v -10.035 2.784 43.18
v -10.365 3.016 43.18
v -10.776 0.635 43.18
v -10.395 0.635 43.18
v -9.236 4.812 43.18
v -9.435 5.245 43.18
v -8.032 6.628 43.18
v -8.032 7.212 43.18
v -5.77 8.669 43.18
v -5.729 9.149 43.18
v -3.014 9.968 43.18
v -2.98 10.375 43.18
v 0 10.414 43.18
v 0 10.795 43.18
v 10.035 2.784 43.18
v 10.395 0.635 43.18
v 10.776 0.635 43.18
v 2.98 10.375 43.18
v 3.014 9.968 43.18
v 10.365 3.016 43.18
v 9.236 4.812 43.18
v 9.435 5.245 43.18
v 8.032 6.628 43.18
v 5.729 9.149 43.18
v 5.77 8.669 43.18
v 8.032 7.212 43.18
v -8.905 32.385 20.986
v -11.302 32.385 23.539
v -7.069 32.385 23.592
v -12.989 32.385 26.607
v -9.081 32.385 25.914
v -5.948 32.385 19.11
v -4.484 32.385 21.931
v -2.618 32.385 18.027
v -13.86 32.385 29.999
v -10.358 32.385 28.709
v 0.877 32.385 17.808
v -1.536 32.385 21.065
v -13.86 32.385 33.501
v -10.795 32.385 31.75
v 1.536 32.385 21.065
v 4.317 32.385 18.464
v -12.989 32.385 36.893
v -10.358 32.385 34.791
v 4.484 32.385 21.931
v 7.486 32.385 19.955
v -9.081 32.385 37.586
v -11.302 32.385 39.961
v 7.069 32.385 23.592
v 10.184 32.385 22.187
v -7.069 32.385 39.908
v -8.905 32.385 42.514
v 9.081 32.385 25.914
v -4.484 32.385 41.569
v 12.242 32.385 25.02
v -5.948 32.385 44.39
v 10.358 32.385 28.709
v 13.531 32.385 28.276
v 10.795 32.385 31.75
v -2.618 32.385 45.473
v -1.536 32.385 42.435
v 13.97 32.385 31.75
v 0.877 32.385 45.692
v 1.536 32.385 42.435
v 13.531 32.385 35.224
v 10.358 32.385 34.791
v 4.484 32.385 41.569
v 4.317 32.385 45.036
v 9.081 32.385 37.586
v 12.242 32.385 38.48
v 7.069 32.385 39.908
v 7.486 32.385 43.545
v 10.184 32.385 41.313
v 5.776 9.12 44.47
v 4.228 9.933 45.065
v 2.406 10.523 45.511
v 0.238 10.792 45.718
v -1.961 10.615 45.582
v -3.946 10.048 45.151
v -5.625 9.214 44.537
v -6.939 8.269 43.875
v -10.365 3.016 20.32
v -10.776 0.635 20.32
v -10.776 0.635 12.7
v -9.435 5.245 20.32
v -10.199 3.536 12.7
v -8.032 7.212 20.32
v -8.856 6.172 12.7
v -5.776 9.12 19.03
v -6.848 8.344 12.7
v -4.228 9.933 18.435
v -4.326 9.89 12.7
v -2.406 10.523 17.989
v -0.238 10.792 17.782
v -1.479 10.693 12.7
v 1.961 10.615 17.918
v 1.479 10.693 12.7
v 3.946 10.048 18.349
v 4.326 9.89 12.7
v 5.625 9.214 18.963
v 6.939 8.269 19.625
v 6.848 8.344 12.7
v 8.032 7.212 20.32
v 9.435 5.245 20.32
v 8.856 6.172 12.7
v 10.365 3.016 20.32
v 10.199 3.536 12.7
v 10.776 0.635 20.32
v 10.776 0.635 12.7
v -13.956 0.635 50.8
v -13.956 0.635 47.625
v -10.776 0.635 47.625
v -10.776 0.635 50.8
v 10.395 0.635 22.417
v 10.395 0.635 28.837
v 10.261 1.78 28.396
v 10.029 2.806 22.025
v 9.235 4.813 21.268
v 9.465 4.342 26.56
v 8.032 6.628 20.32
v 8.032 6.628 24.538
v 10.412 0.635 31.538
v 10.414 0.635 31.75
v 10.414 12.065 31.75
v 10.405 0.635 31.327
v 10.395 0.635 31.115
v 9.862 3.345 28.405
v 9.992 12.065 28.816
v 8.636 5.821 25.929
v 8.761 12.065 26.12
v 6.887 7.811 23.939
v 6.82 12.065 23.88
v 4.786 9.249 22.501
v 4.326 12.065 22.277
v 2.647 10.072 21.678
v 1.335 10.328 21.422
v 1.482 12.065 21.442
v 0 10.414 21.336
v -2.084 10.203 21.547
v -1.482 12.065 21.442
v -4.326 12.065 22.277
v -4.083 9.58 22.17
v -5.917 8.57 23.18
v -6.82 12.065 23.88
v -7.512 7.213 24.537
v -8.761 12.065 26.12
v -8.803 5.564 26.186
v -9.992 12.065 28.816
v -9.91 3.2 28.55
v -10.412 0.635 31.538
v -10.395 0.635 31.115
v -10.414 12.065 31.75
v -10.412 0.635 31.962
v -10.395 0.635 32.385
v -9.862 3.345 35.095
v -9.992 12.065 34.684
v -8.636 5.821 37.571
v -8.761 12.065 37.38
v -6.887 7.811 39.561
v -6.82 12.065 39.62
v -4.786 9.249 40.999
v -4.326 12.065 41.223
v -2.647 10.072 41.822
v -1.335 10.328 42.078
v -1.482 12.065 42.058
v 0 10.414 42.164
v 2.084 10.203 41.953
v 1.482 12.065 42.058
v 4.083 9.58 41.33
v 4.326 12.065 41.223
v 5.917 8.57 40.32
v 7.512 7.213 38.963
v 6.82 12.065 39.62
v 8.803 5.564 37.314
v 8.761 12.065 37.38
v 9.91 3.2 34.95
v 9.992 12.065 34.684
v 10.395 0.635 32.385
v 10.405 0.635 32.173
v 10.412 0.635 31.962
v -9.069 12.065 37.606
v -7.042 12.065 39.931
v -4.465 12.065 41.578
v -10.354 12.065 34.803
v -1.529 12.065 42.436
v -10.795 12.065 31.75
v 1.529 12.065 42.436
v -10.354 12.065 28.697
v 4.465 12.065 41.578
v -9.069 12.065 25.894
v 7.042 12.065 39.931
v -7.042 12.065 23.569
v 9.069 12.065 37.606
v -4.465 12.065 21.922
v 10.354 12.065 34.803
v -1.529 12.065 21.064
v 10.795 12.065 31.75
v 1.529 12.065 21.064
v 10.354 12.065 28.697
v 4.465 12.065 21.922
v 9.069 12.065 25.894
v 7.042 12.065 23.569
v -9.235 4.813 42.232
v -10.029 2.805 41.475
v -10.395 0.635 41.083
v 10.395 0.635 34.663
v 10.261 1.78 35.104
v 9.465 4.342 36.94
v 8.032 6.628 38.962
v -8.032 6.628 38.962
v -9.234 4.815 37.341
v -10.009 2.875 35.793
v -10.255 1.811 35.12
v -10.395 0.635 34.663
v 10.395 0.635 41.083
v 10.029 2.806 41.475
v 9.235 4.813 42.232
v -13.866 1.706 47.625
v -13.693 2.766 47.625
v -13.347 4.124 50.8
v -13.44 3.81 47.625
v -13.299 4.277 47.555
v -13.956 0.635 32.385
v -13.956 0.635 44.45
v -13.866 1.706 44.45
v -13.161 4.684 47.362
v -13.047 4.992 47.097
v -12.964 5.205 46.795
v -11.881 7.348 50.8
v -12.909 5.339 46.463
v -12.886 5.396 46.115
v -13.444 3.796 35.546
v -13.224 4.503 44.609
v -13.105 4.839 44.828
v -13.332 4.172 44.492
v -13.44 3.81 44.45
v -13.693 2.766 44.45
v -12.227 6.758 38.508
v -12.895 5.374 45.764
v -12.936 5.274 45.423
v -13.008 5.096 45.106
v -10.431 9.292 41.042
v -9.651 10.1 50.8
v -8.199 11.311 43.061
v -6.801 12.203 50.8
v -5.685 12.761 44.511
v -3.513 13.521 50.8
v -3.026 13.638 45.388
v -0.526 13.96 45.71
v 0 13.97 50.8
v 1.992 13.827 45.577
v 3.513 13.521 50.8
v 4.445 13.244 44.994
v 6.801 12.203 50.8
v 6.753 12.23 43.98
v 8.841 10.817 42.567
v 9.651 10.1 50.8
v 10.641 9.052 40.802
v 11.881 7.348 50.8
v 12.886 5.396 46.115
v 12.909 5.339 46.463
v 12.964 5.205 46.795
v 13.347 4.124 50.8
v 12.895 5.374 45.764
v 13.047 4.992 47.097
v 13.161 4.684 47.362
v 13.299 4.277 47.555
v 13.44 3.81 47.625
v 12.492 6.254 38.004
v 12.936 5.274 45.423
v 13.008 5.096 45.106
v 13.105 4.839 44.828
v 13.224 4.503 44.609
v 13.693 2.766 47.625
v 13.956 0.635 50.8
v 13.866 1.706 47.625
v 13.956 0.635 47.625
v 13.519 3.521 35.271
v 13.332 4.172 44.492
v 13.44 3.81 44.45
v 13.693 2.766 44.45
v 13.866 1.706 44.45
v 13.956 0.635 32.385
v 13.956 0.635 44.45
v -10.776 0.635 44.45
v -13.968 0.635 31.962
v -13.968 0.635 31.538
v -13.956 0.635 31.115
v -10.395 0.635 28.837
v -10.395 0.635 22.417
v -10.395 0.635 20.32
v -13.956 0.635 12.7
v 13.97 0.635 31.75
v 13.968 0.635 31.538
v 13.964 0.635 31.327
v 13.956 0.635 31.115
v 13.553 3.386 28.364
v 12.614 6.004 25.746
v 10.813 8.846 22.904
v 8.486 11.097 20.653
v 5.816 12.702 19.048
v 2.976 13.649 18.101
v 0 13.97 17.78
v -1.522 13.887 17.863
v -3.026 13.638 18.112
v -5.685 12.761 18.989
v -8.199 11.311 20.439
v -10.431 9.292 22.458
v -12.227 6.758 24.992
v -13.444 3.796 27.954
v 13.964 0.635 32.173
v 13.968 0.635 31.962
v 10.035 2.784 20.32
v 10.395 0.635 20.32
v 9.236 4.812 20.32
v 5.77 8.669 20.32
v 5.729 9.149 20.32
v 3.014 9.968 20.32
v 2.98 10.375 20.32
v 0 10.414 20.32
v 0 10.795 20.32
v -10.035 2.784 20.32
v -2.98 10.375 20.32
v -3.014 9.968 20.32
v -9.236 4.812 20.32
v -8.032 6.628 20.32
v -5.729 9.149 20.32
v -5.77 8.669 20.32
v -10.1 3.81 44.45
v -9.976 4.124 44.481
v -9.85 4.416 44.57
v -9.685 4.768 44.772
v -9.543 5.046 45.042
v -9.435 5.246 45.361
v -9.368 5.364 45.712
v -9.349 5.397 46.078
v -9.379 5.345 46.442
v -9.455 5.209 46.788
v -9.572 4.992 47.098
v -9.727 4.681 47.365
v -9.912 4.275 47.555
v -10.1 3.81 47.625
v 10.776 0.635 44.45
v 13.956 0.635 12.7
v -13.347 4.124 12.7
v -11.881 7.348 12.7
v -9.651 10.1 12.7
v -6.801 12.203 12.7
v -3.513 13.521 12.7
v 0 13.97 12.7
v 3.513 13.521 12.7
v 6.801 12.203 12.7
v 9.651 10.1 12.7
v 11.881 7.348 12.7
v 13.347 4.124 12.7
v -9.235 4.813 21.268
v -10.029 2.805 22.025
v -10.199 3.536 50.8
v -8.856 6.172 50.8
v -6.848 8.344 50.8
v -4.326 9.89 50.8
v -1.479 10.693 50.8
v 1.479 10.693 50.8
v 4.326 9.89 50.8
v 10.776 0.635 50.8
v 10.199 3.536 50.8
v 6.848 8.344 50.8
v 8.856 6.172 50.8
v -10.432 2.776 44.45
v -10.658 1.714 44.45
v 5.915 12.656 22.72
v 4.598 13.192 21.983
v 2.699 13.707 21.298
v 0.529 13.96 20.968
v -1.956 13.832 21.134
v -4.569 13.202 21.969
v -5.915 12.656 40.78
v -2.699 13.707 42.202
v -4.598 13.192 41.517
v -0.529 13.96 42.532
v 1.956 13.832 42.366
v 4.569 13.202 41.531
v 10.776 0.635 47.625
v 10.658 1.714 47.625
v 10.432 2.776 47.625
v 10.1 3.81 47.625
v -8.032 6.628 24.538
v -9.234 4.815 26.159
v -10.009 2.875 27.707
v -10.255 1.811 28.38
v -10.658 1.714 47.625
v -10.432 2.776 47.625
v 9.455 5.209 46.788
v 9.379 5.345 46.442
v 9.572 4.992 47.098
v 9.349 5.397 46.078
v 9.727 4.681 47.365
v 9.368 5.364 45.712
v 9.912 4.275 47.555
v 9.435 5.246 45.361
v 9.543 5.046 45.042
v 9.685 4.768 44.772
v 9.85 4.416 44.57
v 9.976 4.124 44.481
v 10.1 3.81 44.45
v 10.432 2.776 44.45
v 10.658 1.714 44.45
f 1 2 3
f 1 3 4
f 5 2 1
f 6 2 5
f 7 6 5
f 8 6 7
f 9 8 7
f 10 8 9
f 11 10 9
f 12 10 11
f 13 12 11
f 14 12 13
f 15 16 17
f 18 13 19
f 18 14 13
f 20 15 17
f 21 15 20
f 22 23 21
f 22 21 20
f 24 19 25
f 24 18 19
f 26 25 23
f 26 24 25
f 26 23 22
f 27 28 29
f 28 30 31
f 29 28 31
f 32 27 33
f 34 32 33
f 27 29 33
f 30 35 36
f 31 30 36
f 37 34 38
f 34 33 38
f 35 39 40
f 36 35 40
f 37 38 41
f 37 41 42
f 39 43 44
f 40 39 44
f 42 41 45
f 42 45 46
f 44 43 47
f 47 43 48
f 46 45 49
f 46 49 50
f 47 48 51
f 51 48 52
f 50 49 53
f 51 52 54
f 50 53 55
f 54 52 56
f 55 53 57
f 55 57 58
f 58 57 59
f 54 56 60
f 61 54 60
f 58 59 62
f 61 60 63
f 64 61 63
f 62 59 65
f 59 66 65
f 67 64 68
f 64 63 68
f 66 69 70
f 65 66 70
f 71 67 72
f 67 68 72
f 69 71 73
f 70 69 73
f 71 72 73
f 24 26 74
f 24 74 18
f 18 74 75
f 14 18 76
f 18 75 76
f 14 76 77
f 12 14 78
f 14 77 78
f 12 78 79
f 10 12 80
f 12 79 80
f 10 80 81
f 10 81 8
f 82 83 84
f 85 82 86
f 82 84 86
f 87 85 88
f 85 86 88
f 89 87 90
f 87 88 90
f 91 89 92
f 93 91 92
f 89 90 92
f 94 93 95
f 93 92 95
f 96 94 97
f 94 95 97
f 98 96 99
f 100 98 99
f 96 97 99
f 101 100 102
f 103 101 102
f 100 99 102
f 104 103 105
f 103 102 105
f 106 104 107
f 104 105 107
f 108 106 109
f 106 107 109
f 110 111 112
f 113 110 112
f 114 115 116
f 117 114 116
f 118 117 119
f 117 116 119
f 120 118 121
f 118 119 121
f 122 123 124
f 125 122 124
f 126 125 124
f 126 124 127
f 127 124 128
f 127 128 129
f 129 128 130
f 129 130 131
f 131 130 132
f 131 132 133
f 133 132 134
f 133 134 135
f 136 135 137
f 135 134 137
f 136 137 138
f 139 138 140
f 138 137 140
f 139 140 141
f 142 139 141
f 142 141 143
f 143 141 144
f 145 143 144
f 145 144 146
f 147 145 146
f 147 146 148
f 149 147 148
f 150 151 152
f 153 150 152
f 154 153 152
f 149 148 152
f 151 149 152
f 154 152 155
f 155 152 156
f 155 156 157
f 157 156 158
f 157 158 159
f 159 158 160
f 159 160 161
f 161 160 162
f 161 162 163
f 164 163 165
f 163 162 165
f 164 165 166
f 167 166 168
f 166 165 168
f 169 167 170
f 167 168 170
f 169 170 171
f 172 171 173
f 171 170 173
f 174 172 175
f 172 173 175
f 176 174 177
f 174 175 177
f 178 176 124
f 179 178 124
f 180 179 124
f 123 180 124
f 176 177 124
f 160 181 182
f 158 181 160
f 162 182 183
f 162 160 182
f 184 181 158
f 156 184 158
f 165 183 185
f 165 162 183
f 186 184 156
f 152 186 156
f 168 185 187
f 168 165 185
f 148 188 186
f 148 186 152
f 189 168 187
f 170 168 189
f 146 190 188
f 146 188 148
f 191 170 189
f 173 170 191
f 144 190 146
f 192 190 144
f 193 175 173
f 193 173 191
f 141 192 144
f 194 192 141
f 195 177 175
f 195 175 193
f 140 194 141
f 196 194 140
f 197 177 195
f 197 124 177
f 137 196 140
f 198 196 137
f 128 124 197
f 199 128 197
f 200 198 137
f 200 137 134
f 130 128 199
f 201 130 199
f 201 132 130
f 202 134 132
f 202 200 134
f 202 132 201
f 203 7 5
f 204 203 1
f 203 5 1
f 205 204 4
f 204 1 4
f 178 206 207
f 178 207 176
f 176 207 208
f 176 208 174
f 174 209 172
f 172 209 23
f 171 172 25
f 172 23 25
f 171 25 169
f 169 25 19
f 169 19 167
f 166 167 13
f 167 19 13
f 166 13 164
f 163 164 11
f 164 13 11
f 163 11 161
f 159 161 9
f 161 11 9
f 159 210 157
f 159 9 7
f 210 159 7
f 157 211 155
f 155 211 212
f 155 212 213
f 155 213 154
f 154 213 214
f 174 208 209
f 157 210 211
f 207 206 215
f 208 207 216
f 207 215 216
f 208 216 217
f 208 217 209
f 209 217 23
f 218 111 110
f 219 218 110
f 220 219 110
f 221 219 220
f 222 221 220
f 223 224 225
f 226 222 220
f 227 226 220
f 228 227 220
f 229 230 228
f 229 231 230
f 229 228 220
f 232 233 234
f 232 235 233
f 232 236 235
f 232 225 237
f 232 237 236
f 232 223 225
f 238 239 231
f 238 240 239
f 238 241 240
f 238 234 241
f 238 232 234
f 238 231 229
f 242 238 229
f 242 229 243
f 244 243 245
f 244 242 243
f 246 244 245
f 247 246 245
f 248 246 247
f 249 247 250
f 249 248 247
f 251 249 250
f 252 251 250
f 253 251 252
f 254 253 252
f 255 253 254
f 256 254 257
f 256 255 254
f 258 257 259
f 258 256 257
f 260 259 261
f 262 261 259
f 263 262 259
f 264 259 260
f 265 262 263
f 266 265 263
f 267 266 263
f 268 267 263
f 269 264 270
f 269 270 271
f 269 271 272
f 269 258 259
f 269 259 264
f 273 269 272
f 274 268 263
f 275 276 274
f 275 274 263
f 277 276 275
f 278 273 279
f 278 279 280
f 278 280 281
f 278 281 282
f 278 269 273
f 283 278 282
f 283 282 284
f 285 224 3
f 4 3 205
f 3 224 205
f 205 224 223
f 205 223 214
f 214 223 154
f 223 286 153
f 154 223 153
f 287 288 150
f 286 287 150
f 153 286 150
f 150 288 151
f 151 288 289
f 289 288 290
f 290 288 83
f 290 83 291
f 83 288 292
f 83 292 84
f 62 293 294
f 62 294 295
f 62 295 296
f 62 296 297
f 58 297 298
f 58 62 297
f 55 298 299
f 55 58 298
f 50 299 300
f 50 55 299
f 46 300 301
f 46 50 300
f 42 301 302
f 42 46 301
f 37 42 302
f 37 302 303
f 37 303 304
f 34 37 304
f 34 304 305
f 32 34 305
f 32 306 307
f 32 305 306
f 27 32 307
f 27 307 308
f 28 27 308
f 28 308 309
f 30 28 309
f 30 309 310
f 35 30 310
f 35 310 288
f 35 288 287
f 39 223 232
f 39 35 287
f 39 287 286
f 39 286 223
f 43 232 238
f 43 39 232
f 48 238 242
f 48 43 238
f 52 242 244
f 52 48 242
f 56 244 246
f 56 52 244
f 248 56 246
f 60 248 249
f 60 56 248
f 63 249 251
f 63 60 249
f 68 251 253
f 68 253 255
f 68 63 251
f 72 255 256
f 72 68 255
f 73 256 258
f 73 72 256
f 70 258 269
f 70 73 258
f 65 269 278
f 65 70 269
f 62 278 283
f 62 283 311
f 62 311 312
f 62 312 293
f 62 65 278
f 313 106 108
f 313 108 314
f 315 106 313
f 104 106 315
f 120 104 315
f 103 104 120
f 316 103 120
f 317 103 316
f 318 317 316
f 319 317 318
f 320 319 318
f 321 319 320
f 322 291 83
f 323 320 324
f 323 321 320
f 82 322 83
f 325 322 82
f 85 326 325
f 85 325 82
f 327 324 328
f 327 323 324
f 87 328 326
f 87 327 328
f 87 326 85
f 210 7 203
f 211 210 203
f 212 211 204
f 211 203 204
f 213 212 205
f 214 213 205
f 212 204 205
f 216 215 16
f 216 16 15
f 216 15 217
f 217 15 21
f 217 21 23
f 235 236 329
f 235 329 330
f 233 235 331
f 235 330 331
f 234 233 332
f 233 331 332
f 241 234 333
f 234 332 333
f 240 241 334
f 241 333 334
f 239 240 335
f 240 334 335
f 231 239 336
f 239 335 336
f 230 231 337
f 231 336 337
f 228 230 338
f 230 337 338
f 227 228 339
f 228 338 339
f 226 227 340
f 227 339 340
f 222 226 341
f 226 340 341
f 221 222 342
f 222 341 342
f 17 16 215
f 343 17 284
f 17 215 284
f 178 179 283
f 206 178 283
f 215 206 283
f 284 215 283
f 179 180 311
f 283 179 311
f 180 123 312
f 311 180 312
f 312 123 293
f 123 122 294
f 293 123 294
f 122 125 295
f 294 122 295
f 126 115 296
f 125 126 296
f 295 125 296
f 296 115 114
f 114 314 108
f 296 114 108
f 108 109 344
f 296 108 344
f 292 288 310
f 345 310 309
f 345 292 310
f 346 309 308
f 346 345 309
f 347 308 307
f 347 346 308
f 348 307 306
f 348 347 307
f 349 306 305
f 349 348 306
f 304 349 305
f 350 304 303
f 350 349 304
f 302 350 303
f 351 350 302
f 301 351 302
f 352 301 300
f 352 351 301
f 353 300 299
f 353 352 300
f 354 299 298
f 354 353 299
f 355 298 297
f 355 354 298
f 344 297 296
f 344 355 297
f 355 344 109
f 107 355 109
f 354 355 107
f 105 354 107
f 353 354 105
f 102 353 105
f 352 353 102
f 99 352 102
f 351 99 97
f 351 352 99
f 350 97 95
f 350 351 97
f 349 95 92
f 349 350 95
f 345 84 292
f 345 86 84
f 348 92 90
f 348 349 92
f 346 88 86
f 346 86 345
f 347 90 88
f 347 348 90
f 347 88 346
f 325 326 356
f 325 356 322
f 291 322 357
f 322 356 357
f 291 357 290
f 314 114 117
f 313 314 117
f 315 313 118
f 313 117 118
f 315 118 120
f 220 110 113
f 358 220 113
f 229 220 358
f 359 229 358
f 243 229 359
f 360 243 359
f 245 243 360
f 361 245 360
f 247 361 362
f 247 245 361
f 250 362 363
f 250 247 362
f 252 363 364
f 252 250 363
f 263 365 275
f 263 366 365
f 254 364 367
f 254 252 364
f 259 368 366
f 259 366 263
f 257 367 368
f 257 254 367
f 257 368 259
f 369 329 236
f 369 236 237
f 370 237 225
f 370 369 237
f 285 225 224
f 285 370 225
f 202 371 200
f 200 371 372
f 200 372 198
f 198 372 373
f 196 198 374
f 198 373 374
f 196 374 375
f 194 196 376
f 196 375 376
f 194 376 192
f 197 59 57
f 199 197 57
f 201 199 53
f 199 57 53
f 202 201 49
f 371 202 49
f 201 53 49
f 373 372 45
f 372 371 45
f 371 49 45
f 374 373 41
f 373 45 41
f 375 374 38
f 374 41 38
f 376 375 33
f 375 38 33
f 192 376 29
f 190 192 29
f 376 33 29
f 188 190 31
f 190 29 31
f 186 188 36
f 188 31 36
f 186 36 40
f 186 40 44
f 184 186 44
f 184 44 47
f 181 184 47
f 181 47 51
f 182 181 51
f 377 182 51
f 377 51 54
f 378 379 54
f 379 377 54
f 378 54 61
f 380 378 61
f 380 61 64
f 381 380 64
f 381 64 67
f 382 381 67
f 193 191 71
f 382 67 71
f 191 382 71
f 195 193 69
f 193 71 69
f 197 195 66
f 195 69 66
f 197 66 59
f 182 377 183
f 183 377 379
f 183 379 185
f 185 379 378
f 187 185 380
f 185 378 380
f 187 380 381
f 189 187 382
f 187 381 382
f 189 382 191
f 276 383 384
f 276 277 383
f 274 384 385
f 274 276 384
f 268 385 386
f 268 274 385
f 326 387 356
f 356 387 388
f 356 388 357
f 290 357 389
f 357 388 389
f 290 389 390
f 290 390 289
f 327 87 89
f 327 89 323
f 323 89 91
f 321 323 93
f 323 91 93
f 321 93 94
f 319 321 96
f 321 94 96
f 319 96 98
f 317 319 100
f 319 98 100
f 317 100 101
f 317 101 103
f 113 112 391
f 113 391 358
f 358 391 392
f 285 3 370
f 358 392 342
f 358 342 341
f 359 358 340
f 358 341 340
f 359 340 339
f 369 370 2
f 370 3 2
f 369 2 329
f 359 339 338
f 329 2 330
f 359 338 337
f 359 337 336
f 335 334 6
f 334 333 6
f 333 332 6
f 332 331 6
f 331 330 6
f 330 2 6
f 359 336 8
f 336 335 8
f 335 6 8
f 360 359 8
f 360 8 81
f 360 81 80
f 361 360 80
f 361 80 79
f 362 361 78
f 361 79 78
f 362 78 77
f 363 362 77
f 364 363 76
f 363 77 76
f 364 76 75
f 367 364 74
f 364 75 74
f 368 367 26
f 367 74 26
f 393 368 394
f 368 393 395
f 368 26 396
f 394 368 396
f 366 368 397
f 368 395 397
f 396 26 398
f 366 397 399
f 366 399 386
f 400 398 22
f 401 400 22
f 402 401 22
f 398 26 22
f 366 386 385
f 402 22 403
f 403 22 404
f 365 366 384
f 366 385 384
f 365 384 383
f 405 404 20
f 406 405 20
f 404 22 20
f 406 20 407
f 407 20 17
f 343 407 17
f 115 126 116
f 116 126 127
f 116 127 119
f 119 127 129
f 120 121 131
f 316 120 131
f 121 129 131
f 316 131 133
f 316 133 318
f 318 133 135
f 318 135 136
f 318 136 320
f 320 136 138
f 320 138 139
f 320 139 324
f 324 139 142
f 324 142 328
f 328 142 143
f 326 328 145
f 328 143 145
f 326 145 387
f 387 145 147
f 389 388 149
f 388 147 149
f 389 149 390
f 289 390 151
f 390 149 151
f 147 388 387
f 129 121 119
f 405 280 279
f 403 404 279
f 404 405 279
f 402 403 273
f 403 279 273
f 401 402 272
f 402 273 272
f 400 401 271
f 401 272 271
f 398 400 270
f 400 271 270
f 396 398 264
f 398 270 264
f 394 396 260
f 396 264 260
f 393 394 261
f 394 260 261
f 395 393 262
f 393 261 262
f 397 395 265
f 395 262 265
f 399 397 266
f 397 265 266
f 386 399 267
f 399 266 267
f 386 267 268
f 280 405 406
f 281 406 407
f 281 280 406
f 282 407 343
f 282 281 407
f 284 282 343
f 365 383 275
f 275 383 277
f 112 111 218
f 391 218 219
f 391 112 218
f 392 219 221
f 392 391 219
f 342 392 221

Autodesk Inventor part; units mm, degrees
sketch "Sketch1" plane through (0, 0, 0) normal (0, 0, 1) x (1, 0, 0)
  circle A0 centre (0, 0) radius 13.97
  circle A1 centre (0, 0) radius 10.795
  dimension "d0" = 27.94
  dimension "d2" = 21.59
extrude "Extrusion1" add sketch "Sketch1" along normal blind 63.5
ref_plane "Work Plane1" through (0, 0, 43.18) normal (0, 0, 1) x (1, 0, 0)
sketch "Sketch2" plane through (0, 0, 43.18) normal (0, 0, 1) x (1, 0, 0)
  circle A0 centre (0, 0) radius 10.414
  circle A1 centre (0, 0) radius 10.795
  dimension "d6" = 20.828
  dimension "d9" = 21.59
extrude "Extrusion2" add sketch "Sketch2" against normal blind 28.829
sketch "Sketch3" plane through (0, 0, 63.5) normal (0, 0, 1) x (1, 0, 0)
  circle A0 centre (0, 0) radius 10.795 projected
  circle A1 centre (0, 0) radius 13.97 projected
  line L0 (-25.6243, 13.97) -> (27.2368, 13.97)
ref_plane "Work Plane8" through (-25.6243, 32.385, 63.5) normal (0, -1, 0) x (1, 0, 0)
ref_plane "Work Plane7" through (-25.6243, 13.97, 63.5) normal (0, -1, 0) x (1, 0, 0)
sketch "Sketch10" plane through (0, 0, 0) normal (0, 0, -1) x (-1, 0, 0)
  circle A0 centre (0, 0) radius 10.795 projected
extrude "Extrusion8" cut sketch "Sketch10" against normal blind 20.32
sketch "Sketch11" plane through (-25.6243, 32.385, 63.5) normal (0, -1, 0) x (1, 0, 0)
  circle A0 centre (25.6243, -31.75) radius 13.97
  circle A1 centre (25.6243, -31.75) radius 10.795
  point P0 (25.6243, -63.5)
  dimension "d45" = 31.75
  dimension "d46" = 27.94
  dimension "d47" = 21.59
extrude "Extrusion9" add sketch "Sketch11" along normal blind 32.385
sketch "Sketch12" plane through (0, 0, 43.18) normal (0, 0, 1) x (1, 0, 0)
  arc A0 (-8.0322, 6.6284) -> (8.0322, 6.6284) centre (0, 0) ccw projected
  circle A1 centre (0, 0) radius 10.414
extrude "Extrusion10" cut sketch "Sketch12" against normal blind 76.2
sketch "Sketch13" plane through (0, 32.385, 31.75) normal (0, 1, 0) x (1, 0, 0)
  circle A0 centre (0, 0) radius 10.795 projected
  point P0 (0, 31.75)
extrude "Extrusion11" cut sketch "Sketch13" against normal blind 32.385
ref_plane "Work Plane9" through (0, 12.065, 31.75) normal (0, 1, 0) x (1, 0, 0)
sketch "Sketch14" plane through (0, 12.065, 31.75) normal (0, 1, 0) x (1, 0, 0)
  circle A0 centre (0, 0) radius 10.795
  circle A1 centre (0, 0) radius 10.414
  point P0 (0, 31.75)
  dimension "d55" = 21.59
  dimension "d57" = 20.828
extrude "Extrusion12" add sketch "Sketch14" against normal blind 12.7
extrude "Extrusion13" cut sketch "Sketch2" along normal mid plane 76.2 contours A0
sketch "Sketch15" plane through (0, 0, 63.5) normal (0, 0, 1) x (1, 0, 0)
  circle A0 centre (0, 0) radius 10.795 projected
extrude "Extrusion14" cut sketch "Sketch15" against normal blind 20.32
sketch "Sketch16" plane through (0, 0, 0) normal (0, 0, -1) x (-1, 0, 0)
  circle A0 centre (0, 0) radius 10.795 projected
extrude "Extrusion15" cut sketch "Sketch16" against normal blind 20.32
ref_plane "Work Plane10" through (0, 0.635, 31.75) normal (0, 1, 0) x (1, 0, 0)
sketch "Sketch17" plane through (0, 0.635, 31.75) normal (0, 1, 0) x (1, 0, 0)
  line L0 (-45.1678, 43.2051) -> (58.2697, 43.2051)
  line L1 (58.2697, 43.2051) -> (58.2697, -50.7572)
  line L2 (58.2697, -50.7572) -> (-45.1678, -50.7572)
  line L3 (-45.1678, -50.7572) -> (-45.1678, 43.2051)
  point P0 (0, 31.75)
extrude "Extrusion16" cut sketch "Sketch17" against normal blind 25.4
sketch "Sketch18" plane through (0, 0, 63.5) normal (0, 0, 1) x (1, 0, 0)
  line L0 (-13.9556, 0.635) -> (-10.7763, 0.635) projected
  arc A0 (10.7763, 0.635) -> (-10.7763, 0.635) centre (0, 0) ccw projected
  line L1 (10.7763, 0.635) -> (13.9556, 0.635) projected
  arc A1 (13.9556, 0.635) -> (-13.9556, 0.635) centre (0, 0) ccw projected
extrude "Extrusion17" cut sketch "Sketch18" against normal blind 12.7
sketch "Sketch19" plane through (0, 0, 0) normal (0, 0, -1) x (-1, 0, 0)
  line L0 (10.7763, 0.635) -> (13.9556, 0.635) projected
  arc A0 (13.9556, 0.635) -> (-13.9556, 0.635) centre (0, 0) ccw projected
  line L1 (-13.9556, 0.635) -> (-10.7763, 0.635) projected
  arc A1 (10.7763, 0.635) -> (-10.7763, 0.635) centre (0, 0) ccw projected
extrude "Extrusion18" cut sketch "Sketch19" against normal blind 12.7
ref_plane "Work Plane11" through (-10.7763, 0.635, 0) normal (-1, 0, 0) x (0, 0, -1)
sketch "Sketch20" plane through (-10.7763, 0.635, 0) normal (-1, 0, 0) x (0, 0, -1)
  arc A0 (-47.625, -3.175) -> (-44.45, -3.175) centre (-46.0375, -3.175) ccw
  line L0 (-44.45, -3.175) -> (-44.45, 0)
  line L1 (-44.45, 0) -> (-47.625, 0)
  line L2 (-47.625, 0) -> (-47.625, -3.175)
  point P0 (0, 0.635)
  point P1 (-50.8, 0)
  point P2 (-46.0375, 0)
  dimension "d74" = 0.635
  dimension "d75" = 50.8
  dimension "d76" = 3.175
  dimension "d77" = 3.175
  dimension "d78" = 1.5875
  dimension "d79" = 3.175
extrude "Extrusion19" cut sketch "Sketch20" along normal mid plane 50.8
properties part number "0.5 Frame Mount" material "PVC-Piping"
